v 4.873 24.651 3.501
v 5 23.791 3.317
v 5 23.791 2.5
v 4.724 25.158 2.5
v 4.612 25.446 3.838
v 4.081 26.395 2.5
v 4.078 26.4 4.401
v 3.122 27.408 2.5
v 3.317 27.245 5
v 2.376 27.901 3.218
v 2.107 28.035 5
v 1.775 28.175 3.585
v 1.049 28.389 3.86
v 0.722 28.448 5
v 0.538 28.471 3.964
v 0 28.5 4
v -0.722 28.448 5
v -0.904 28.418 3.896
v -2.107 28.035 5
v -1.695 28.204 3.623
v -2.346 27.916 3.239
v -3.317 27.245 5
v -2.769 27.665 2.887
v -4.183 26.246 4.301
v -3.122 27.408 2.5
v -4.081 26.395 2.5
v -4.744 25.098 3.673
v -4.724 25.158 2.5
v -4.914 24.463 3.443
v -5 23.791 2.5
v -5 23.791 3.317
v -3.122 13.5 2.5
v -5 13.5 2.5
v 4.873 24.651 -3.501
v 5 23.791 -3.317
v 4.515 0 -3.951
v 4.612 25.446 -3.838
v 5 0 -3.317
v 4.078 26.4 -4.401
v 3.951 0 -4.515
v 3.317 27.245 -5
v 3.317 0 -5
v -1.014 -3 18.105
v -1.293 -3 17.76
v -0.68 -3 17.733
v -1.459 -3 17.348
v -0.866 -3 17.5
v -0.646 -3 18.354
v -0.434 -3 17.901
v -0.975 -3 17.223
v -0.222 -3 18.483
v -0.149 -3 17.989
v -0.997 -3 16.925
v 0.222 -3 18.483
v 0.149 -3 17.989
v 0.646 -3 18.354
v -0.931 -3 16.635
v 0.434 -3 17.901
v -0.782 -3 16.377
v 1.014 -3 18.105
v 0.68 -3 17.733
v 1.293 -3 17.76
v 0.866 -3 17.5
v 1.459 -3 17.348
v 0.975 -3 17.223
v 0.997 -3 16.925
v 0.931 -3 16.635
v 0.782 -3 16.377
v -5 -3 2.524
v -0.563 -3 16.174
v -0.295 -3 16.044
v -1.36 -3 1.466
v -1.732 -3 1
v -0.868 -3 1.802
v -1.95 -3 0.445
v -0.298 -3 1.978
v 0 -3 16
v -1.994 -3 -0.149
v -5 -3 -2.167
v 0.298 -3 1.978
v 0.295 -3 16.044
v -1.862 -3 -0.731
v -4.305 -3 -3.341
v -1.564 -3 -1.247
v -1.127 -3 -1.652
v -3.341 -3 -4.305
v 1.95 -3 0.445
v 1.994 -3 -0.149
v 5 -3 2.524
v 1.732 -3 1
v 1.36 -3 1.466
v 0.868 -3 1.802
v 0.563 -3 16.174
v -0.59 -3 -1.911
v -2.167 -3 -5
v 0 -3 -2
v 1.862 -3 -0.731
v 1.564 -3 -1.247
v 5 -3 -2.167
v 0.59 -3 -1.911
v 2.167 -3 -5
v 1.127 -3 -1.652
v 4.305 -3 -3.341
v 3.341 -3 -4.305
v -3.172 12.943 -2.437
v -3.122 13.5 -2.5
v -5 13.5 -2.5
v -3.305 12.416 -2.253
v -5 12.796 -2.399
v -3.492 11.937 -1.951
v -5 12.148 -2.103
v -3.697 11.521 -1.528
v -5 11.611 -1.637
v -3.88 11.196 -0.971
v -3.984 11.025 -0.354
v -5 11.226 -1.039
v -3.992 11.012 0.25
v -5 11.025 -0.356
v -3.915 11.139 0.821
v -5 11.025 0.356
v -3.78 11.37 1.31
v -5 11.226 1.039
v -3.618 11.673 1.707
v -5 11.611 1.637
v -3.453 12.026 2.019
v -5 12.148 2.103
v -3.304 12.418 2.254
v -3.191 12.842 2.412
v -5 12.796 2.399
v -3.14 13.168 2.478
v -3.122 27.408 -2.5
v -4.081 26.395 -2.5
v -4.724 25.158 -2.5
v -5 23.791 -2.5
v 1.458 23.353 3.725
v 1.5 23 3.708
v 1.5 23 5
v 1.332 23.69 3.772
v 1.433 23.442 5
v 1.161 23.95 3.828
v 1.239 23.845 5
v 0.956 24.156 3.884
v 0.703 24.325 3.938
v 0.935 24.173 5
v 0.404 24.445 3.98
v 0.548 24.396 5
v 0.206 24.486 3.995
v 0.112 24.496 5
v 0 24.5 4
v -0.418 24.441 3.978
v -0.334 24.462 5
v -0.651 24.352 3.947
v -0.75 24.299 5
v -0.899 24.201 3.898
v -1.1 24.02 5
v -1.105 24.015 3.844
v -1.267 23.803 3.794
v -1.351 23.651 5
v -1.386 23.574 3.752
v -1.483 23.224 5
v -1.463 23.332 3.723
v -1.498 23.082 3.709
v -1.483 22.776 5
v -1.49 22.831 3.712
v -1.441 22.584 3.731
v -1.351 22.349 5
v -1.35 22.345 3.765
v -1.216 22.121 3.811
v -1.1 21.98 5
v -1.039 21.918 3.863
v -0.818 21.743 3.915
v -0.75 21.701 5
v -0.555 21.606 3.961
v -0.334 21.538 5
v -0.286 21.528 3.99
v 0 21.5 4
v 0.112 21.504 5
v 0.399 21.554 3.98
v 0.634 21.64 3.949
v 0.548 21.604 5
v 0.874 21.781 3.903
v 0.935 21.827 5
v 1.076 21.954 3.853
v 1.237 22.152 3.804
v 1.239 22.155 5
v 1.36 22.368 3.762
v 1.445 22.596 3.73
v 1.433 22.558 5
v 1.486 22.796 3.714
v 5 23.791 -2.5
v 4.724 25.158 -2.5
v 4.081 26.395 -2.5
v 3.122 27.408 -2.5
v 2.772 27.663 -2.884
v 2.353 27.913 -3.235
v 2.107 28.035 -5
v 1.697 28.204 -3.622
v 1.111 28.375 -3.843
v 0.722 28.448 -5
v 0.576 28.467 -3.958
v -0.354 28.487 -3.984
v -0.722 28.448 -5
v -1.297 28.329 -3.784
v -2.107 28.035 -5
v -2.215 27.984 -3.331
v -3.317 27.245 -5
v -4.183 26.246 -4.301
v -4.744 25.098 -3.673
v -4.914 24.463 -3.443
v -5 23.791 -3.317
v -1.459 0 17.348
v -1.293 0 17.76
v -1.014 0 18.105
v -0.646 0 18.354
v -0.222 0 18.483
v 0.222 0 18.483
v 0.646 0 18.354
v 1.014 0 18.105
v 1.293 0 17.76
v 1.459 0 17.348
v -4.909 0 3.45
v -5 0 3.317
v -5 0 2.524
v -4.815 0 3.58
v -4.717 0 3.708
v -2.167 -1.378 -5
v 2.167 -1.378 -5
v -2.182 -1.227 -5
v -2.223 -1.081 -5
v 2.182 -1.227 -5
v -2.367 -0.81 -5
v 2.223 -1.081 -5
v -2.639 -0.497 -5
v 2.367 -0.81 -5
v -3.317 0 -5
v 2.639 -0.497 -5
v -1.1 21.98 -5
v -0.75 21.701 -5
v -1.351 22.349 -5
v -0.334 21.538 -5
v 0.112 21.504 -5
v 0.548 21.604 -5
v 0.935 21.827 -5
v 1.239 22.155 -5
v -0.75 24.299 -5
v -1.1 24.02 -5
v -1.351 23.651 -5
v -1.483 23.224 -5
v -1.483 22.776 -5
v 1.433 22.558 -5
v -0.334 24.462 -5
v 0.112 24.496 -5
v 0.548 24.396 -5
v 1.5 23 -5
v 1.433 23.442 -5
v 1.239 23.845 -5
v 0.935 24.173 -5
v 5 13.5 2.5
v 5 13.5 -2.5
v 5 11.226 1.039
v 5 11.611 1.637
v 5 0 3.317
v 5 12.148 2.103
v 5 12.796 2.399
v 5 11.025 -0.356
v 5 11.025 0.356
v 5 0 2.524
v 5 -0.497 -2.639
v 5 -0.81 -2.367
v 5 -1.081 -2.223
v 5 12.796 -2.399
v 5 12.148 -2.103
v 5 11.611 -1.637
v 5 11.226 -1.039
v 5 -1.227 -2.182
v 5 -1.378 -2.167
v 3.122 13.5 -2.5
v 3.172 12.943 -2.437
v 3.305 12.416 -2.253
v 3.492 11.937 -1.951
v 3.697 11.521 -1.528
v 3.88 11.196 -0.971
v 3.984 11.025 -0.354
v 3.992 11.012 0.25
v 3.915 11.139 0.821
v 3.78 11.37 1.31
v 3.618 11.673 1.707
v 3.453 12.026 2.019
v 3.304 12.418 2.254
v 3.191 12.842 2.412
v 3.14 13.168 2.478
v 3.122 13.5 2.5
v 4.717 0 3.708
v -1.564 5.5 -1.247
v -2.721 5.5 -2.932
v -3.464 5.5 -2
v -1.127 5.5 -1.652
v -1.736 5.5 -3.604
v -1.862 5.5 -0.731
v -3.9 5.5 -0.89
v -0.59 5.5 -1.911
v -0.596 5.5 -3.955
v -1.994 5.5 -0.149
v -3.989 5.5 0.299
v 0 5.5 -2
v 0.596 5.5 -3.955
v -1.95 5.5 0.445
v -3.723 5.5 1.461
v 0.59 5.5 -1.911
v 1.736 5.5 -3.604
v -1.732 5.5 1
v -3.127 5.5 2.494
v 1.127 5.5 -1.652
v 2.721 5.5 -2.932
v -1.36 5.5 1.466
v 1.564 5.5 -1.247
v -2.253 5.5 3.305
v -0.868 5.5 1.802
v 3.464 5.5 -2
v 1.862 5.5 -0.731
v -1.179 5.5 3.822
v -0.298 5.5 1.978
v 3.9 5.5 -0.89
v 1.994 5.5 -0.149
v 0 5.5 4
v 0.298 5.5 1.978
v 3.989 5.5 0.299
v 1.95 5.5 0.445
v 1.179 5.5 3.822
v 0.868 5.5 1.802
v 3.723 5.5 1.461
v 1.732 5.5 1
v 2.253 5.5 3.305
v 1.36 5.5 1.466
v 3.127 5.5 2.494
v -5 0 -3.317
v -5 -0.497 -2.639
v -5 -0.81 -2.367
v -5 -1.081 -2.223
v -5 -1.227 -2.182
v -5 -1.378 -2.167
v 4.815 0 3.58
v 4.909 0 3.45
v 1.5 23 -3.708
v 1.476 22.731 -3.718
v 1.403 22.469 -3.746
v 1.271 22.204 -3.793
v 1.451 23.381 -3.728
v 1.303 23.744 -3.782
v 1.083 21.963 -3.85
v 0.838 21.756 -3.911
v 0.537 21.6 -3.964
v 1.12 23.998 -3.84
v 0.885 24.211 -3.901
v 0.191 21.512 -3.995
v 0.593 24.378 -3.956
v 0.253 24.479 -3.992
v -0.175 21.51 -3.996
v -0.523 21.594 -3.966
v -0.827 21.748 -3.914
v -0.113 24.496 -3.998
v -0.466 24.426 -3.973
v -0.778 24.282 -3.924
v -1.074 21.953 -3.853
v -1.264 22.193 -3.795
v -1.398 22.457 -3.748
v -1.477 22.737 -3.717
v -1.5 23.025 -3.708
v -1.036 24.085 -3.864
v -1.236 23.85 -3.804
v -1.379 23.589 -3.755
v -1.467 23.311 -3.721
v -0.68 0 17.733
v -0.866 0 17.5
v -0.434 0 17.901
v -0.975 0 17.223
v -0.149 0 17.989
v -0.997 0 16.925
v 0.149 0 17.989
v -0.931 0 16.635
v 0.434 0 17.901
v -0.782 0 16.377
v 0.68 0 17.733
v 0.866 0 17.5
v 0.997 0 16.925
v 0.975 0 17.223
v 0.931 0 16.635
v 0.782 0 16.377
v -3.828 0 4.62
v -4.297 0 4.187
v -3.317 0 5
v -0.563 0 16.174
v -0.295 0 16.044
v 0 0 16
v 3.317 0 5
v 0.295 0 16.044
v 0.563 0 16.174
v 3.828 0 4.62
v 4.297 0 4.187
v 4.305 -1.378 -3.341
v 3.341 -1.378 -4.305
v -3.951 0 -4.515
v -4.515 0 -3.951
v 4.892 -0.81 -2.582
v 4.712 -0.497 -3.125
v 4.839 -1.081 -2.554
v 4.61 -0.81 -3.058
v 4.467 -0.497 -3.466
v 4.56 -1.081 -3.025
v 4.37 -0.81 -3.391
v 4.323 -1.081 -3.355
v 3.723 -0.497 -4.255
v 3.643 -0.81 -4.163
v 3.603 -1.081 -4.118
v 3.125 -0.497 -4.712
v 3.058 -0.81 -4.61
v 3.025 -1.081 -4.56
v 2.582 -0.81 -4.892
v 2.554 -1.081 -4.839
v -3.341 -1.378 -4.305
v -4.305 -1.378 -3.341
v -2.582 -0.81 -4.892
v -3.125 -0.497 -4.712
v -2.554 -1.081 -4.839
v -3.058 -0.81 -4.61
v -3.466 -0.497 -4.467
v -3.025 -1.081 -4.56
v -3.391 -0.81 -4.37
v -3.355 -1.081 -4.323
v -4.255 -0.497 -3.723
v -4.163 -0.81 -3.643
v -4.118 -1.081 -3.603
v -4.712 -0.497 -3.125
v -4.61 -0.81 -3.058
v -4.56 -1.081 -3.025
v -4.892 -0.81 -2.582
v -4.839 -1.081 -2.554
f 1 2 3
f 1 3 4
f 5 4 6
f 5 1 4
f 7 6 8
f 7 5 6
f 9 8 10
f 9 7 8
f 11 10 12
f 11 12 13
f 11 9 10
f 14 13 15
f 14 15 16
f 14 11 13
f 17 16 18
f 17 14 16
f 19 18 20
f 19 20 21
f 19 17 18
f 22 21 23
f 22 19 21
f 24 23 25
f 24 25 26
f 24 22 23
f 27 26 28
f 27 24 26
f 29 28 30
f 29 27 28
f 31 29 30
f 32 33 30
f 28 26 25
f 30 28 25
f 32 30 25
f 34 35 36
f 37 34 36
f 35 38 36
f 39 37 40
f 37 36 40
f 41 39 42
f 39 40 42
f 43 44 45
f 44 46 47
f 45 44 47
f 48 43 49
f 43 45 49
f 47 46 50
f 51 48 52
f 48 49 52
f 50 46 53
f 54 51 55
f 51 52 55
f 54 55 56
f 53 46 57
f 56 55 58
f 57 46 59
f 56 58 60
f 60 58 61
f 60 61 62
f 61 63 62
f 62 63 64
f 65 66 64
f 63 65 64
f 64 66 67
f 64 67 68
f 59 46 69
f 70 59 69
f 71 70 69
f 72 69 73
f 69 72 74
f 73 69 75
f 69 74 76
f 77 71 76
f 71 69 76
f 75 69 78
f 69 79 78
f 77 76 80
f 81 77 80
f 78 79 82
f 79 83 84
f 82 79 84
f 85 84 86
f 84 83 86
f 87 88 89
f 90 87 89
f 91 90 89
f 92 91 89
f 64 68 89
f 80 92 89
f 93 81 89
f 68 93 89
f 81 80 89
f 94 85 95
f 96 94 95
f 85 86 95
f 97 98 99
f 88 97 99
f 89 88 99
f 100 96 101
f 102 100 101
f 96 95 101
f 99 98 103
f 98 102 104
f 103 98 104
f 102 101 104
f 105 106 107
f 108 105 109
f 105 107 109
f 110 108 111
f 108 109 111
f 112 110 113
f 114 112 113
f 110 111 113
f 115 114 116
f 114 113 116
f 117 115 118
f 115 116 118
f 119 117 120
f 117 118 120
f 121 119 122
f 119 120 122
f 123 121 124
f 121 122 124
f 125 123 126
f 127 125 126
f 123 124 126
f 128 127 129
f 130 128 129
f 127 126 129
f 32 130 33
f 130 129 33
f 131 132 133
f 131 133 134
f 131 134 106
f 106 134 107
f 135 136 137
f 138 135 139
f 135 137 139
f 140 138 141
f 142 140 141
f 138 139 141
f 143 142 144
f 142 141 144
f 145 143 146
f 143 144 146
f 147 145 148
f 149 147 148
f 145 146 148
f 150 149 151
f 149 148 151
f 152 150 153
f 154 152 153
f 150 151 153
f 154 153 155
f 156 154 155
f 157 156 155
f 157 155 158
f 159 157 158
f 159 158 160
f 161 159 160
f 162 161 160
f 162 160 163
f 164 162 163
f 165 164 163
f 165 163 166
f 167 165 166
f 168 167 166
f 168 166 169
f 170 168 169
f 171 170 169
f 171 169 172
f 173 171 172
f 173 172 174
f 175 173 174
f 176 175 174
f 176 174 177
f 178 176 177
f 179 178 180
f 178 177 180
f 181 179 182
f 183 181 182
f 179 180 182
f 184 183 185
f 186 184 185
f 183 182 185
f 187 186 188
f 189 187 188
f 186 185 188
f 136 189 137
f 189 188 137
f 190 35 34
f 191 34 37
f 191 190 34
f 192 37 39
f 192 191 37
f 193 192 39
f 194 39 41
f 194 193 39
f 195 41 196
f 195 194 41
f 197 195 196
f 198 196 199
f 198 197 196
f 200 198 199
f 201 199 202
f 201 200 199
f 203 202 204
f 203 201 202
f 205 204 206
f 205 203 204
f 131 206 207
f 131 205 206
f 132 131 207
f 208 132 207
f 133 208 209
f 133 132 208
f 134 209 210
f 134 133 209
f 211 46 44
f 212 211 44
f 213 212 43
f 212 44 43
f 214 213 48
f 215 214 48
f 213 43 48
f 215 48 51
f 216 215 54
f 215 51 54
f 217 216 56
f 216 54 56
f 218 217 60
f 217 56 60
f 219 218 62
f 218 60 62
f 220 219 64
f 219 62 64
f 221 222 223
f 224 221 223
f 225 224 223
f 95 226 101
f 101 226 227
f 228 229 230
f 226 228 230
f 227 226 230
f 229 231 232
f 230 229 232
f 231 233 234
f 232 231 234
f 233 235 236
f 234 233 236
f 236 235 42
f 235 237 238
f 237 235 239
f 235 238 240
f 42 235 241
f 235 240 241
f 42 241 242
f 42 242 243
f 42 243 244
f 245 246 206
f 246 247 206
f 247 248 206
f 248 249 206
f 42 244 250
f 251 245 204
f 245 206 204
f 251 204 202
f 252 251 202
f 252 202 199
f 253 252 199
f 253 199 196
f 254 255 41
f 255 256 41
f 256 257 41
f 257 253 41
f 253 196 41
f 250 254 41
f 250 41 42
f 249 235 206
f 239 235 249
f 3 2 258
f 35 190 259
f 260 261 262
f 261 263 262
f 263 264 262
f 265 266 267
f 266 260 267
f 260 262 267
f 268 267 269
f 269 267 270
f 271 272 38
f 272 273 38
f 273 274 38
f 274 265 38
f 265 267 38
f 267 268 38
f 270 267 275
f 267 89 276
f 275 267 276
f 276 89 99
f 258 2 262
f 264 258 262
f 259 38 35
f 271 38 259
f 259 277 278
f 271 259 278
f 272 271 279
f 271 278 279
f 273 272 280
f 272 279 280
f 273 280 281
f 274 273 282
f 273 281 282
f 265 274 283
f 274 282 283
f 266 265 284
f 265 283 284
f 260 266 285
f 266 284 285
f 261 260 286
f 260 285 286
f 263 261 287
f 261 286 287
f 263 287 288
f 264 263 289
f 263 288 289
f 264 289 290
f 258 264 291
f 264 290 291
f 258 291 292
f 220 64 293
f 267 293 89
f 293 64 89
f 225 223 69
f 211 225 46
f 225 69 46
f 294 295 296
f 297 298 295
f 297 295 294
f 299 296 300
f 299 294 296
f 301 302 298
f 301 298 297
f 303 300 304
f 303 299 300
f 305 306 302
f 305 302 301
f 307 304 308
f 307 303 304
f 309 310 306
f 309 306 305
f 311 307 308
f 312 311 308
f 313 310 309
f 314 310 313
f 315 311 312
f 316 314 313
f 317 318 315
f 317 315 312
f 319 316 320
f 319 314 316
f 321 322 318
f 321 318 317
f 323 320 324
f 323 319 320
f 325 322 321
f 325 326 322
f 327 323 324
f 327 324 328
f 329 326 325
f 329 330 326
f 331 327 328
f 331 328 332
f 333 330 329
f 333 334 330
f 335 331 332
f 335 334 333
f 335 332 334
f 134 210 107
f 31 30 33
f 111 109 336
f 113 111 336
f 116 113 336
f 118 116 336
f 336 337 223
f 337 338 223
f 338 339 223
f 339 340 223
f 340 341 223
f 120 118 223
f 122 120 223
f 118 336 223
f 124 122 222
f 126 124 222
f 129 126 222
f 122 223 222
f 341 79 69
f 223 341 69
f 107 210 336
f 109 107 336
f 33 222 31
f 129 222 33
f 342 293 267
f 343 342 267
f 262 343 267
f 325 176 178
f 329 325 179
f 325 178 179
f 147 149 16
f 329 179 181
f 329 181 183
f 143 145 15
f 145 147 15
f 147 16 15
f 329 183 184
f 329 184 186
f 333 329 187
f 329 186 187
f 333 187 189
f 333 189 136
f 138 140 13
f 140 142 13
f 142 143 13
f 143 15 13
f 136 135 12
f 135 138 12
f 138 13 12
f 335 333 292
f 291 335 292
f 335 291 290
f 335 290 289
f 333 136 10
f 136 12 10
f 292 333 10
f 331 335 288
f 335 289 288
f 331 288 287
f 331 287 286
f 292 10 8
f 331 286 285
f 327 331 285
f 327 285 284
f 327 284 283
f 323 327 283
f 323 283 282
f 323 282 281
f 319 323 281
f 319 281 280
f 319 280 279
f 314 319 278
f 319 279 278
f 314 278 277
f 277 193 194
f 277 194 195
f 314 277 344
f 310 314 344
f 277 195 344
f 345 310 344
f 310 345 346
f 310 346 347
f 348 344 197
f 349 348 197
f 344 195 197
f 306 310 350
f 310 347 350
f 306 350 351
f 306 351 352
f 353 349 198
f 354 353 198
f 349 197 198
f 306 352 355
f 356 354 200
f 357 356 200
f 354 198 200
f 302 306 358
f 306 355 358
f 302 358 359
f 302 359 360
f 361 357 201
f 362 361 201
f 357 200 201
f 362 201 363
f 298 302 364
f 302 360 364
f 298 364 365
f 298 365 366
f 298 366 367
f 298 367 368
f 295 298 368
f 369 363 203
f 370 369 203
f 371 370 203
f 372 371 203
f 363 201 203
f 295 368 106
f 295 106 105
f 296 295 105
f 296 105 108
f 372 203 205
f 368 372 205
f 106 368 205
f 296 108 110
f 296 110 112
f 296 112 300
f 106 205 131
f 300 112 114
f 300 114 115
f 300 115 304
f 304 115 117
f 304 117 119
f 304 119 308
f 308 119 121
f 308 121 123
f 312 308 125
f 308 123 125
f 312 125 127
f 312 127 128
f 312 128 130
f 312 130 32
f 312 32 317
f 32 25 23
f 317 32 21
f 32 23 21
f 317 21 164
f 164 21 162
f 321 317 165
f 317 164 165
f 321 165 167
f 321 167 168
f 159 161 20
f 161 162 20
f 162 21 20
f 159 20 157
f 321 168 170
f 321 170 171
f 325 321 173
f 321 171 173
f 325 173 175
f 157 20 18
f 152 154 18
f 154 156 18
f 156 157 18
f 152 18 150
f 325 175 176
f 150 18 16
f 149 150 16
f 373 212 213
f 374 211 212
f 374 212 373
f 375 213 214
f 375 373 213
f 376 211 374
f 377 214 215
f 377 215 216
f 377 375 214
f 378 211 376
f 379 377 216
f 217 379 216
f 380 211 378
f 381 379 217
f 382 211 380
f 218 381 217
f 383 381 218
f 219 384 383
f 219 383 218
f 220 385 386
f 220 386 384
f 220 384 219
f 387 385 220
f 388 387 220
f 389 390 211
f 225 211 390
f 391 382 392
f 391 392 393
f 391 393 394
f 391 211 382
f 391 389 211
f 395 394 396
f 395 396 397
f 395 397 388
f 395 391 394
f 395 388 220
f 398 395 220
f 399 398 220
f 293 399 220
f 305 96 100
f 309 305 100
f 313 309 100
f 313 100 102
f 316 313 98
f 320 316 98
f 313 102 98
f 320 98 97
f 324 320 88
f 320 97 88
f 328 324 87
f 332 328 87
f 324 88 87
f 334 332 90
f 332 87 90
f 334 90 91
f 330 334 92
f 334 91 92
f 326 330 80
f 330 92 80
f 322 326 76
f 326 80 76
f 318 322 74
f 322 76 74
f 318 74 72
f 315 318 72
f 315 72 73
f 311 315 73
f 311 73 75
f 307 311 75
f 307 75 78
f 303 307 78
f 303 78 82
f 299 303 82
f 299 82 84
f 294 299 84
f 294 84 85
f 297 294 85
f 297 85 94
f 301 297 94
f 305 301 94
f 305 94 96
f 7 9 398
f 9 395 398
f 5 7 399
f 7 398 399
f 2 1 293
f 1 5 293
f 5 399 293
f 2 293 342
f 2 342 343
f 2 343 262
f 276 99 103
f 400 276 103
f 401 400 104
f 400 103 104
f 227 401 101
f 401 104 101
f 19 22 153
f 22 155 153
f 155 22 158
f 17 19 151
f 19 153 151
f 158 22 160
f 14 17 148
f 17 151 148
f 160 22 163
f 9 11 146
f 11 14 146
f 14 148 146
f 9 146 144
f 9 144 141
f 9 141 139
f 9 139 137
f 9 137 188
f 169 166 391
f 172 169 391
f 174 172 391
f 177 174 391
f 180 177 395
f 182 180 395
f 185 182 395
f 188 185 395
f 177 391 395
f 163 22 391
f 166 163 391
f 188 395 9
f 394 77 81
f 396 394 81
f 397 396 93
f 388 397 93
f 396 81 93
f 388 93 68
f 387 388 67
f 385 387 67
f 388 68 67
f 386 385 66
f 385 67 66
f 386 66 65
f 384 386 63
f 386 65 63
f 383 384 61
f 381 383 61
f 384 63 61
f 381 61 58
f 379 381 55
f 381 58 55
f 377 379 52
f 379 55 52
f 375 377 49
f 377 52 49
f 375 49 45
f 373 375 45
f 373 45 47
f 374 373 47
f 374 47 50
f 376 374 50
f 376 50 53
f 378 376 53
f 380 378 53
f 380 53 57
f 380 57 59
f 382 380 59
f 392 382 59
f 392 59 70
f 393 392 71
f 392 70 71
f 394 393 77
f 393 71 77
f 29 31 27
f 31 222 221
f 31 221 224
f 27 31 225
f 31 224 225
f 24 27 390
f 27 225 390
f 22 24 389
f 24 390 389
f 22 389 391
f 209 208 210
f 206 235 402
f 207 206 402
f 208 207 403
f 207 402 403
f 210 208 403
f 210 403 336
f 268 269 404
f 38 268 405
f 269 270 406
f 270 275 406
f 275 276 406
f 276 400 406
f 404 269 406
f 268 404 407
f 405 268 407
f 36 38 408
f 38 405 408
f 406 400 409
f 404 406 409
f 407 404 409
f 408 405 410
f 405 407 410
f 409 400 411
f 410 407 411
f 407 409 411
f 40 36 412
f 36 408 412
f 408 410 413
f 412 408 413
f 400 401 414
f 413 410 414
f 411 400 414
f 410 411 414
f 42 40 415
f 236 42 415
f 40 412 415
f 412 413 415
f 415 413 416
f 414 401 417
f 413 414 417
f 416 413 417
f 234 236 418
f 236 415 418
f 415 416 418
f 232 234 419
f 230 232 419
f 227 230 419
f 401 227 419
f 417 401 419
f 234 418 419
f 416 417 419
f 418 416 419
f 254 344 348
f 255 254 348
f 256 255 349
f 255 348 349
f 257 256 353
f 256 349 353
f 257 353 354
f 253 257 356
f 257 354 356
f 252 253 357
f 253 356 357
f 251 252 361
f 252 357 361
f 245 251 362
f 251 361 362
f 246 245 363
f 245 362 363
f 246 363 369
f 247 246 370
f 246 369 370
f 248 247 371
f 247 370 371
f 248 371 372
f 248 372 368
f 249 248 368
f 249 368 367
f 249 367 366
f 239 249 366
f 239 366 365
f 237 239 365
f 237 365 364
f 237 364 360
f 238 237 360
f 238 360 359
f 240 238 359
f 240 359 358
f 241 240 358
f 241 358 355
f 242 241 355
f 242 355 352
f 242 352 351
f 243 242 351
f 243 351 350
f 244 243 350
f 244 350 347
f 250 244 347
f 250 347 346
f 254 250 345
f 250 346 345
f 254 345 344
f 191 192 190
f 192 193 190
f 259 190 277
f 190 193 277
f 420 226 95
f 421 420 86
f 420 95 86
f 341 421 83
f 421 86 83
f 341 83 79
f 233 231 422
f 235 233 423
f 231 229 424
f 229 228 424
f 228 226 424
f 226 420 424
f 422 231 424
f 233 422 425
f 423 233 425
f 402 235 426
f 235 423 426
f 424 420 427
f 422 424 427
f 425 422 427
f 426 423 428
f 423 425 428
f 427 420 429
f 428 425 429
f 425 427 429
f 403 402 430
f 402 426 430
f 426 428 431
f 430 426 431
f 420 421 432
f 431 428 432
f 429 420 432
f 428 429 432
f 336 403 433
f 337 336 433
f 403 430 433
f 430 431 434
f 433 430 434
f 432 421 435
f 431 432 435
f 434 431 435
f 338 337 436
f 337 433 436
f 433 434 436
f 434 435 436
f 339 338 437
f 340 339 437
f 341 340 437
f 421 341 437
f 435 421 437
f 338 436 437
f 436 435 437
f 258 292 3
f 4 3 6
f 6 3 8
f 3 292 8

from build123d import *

# Parameters (mm, degrees)
SKETCH1_R           = 6
SKETCH1_R_2         = 2
BOSS_EXTRUDE1_DEPTH = 28.5
SKETCH2_R           = 2
SKETCH2_R_2         = 1
BOSS_EXTRUDE2_DEPTH = 3
SKETCH3_R           = 4
CUT_EXTRUDE1_DEPTH  = 23
SKETCH4_W           = 13
SKETCH4_H           = 13
SKETCH4_W_2         = 10
SKETCH4_H_2         = 10
CUT_EXTRUDE2_DEPTH  = 35.503622998
CUT_EXTRUDE5_DEPTH  = 33.003091855
SKETCH9_W           = 5
SKETCH9_H           = 4.708815116
CUT_EXTRUDE6_DEPTH  = 36.548469223
CUT_EXTRUDE7_DEPTH  = 35.412176554
SKETCH11_R          = 1.5
CUT_EXTRUDE8_DEPTH  = 32.929610206
FILLET1_R           = 2


with BuildPart() as part:
    # Sketch1 → Boss-Extrude1 (new body)
    with BuildSketch(Plane(origin=(0, 0, 0), x_dir=(1, 0, 0), z_dir=(0, 1, 0))):
        with Locations(Location((0, 0, 0), (0, 0, 90))):
            Circle(SKETCH1_R)
        with Locations(Location((0, 0, 0), (0, 0, 90))):
            Circle(SKETCH1_R_2, mode=Mode.SUBTRACT)
    extrude(amount=BOSS_EXTRUDE1_DEPTH)

    # Sketch2 → Boss-Extrude2 (add)
    with BuildSketch(Plane(origin=(0, -3, 0), x_dir=(-1, 0, 0), z_dir=(0, -1, 0))):
        with BuildLine():
            Line((-1.458956227, -17.348492079), (-5.300462758, -1.266089585))
            ThreePointArc((-5.300462758, -1.266089585), (0, 5.449576891), (5.300462758, -1.266089585))
            Line((5.300462758, -1.266089585), (1.458956227, -17.348492079))
            ThreePointArc((1.458956227, -17.348492079), (0, -18.5), (-1.458956227, -17.348492079))
        make_face()
        with Locations(Location((0, 0, 0), (0, 0, 90))):
            Circle(SKETCH2_R, mode=Mode.SUBTRACT)
        with Locations(Location((0, -17, 0), (0, 0, 90))):
            Circle(SKETCH2_R_2, mode=Mode.SUBTRACT)
    extrude(amount=-BOSS_EXTRUDE2_DEPTH)

    # Sketch3 → Cut-Extrude1 (cut)
    with BuildSketch(Plane(origin=(0, 28.5, 0), x_dir=(1, 0, 0), z_dir=(0, 1, 0))):
        with Locations(Location((0, 0, 0), (0, 0, 270))):
            Circle(SKETCH3_R)
    extrude(amount=-CUT_EXTRUDE1_DEPTH, mode=Mode.SUBTRACT)

    # Sketch4 → Cut-Extrude2 (cut, through all)
    with BuildSketch(Plane(origin=(0, 0, 0), x_dir=(1, 0, 0), z_dir=(0, 1, 0))):
        Rectangle(SKETCH4_W, SKETCH4_H)
        Rectangle(SKETCH4_W_2, SKETCH4_H_2, mode=Mode.SUBTRACT)
    extrude(amount=CUT_EXTRUDE2_DEPTH, mode=Mode.SUBTRACT)

    # Sketch8 → Cut-Extrude5 (cut, through all)
    with BuildSketch(Plane.XY.offset(5)):
        with BuildLine():
            Line((-5, 23.791184884), (-6.441511966, 23.791184884))
            Line((-6.441511966, 23.791184884), (-6.441511966, 29.385647876))
            Line((-6.441511966, 29.385647876), (5.988439259, 29.385647876))
            Line((5.988439259, 29.385647876), (5.988439259, 23.791184884))
            Line((5.988439259, 23.791184884), (5, 23.791184884))
            ThreePointArc((5, 23.791184884), (0, 28.5), (-5, 23.791184884))
        make_face()
    extrude(amount=-CUT_EXTRUDE5_DEPTH, mode=Mode.SUBTRACT)

    # Sketch9 → Cut-Extrude6 (cut, through all)
    with BuildSketch(Plane.ZY.offset(5)):
        with Locations((0, 26.145592442)):
            Rectangle(SKETCH9_W, SKETCH9_H)
        with BuildLine():
            Line((2.5, 23.791184884), (-2.5, 23.791184884))
            Line((-2.5, 23.791184884), (-2.5, 13.5))
            ThreePointArc((-2.5, 13.5), (0, 11), (2.5, 13.5))
            Line((2.5, 13.5), (2.5, 23.791184884))
        make_face()
    extrude(amount=-CUT_EXTRUDE6_DEPTH, mode=Mode.SUBTRACT)

    # Sketch10 → Cut-Extrude7 (cut, through all)
    with BuildSketch(Plane(origin=(0, 0, 0), x_dir=(1, 0, 0), z_dir=(0, 1, 0))):
        Polygon((-5, 3.31662479), (-5, -3.31662479), (-6.387377767, -3.31662479), (-6.387377767, 5), (-6.387377767, 6.820918536), (6.983329281, 6.820918536), (6.983329281, -3.31662479), (5, -3.31662479), (5, 5), (-5, 5), align=None)
    extrude(amount=-CUT_EXTRUDE7_DEPTH, mode=Mode.SUBTRACT)

    # Sketch11 → Cut-Extrude8 (cut, through all)
    with BuildSketch(Plane.XY.offset(5)):
        with Locations((0, 23)):
            Circle(SKETCH11_R)
    extrude(amount=-CUT_EXTRUDE8_DEPTH, mode=Mode.SUBTRACT)

    # Fillet1
    # the kernel refuses this fillet: 2 mm, written as the material it adds along each edge
    with BuildSketch(Plane(origin=(0, 0, 0), x_dir=(0.9752052541729319, 0, 0.22130230959822164), z_dir=(-0.22130230959822164, 0, 0.9752052541729319))) as fillet1_piece_1_section:
        with BuildLine():
            CenterArc((7.449576891, -1.377942973), FILLET1_R, 136.451251834, 43.548748166)
            Line((5.449576891, -1.377942973), (5.409576891, -1.377942973))
            Line((5.409576891, -1.377942973), (5.409576891, 0))
            Line((5.409576891, 0), (5.449576891, 0.04))
            ThreePointArc((5.449576891, 0.04), (5.724788445, 0.04), (5.971008462, 0.027558859))
            Line((5.971008462, 0.027558859), (6, 0))
        make_face()
    fillet1_piece_1 = revolve(axis=Axis((0, 0, 0), (0, 1, 0)), revolution_arc=115.571070831, mode=Mode.PRIVATE)
    fillet1_piece_1 = split(fillet1_piece_1, bisect_by=Plane(origin=(5, -0.397015398, -3.862769036), z_dir=(-1, 0, 0)), keep=Keep.TOP, mode=Mode.PRIVATE)
    fillet1_piece_1 = split(fillet1_piece_1, bisect_by=Plane(origin=(3.862770037, -0.397015398, -5), z_dir=(0, 0, 1)), keep=Keep.TOP, mode=Mode.PRIVATE)
    add(fillet1_piece_1)
    with BuildSketch(Plane(origin=(0, 0, 0), x_dir=(0.221302309598303, 0, -0.9752052541729136), z_dir=(0.9752052541729136, 0, 0.221302309598303))) as fillet1_piece_2_section:
        with BuildLine():
            CenterArc((7.449576891, -1.377942973), FILLET1_R, 136.451251834, 43.548748166)
            Line((6, 0), (5.971008462, 0.027558859))
            ThreePointArc((5.971008462, 0.027558859), (5.724788445, 0.04), (5.449576891, 0.04))
            Line((5.449576891, 0.04), (5.409576891, 0))
            Line((5.409576891, 0), (5.409576891, -1.377942973))
            Line((5.409576891, -1.377942973), (5.449576891, -1.377942973))
        make_face()
    fillet1_piece_2 = revolve(axis=Axis((0, 0, 0), (0, 1, 0)), revolution_arc=115.571070831, mode=Mode.PRIVATE)
    fillet1_piece_2 = split(fillet1_piece_2, bisect_by=Plane(origin=(-3.862770028, -0.397015251, -5), z_dir=(0, 0, 1)), keep=Keep.TOP, mode=Mode.PRIVATE)
    fillet1_piece_2 = split(fillet1_piece_2, bisect_by=Plane(origin=(-5, -0.397015251, -3.862769283), z_dir=(1, 0, 0)), keep=Keep.TOP, mode=Mode.PRIVATE)
    add(fillet1_piece_2)


solid = part.part
